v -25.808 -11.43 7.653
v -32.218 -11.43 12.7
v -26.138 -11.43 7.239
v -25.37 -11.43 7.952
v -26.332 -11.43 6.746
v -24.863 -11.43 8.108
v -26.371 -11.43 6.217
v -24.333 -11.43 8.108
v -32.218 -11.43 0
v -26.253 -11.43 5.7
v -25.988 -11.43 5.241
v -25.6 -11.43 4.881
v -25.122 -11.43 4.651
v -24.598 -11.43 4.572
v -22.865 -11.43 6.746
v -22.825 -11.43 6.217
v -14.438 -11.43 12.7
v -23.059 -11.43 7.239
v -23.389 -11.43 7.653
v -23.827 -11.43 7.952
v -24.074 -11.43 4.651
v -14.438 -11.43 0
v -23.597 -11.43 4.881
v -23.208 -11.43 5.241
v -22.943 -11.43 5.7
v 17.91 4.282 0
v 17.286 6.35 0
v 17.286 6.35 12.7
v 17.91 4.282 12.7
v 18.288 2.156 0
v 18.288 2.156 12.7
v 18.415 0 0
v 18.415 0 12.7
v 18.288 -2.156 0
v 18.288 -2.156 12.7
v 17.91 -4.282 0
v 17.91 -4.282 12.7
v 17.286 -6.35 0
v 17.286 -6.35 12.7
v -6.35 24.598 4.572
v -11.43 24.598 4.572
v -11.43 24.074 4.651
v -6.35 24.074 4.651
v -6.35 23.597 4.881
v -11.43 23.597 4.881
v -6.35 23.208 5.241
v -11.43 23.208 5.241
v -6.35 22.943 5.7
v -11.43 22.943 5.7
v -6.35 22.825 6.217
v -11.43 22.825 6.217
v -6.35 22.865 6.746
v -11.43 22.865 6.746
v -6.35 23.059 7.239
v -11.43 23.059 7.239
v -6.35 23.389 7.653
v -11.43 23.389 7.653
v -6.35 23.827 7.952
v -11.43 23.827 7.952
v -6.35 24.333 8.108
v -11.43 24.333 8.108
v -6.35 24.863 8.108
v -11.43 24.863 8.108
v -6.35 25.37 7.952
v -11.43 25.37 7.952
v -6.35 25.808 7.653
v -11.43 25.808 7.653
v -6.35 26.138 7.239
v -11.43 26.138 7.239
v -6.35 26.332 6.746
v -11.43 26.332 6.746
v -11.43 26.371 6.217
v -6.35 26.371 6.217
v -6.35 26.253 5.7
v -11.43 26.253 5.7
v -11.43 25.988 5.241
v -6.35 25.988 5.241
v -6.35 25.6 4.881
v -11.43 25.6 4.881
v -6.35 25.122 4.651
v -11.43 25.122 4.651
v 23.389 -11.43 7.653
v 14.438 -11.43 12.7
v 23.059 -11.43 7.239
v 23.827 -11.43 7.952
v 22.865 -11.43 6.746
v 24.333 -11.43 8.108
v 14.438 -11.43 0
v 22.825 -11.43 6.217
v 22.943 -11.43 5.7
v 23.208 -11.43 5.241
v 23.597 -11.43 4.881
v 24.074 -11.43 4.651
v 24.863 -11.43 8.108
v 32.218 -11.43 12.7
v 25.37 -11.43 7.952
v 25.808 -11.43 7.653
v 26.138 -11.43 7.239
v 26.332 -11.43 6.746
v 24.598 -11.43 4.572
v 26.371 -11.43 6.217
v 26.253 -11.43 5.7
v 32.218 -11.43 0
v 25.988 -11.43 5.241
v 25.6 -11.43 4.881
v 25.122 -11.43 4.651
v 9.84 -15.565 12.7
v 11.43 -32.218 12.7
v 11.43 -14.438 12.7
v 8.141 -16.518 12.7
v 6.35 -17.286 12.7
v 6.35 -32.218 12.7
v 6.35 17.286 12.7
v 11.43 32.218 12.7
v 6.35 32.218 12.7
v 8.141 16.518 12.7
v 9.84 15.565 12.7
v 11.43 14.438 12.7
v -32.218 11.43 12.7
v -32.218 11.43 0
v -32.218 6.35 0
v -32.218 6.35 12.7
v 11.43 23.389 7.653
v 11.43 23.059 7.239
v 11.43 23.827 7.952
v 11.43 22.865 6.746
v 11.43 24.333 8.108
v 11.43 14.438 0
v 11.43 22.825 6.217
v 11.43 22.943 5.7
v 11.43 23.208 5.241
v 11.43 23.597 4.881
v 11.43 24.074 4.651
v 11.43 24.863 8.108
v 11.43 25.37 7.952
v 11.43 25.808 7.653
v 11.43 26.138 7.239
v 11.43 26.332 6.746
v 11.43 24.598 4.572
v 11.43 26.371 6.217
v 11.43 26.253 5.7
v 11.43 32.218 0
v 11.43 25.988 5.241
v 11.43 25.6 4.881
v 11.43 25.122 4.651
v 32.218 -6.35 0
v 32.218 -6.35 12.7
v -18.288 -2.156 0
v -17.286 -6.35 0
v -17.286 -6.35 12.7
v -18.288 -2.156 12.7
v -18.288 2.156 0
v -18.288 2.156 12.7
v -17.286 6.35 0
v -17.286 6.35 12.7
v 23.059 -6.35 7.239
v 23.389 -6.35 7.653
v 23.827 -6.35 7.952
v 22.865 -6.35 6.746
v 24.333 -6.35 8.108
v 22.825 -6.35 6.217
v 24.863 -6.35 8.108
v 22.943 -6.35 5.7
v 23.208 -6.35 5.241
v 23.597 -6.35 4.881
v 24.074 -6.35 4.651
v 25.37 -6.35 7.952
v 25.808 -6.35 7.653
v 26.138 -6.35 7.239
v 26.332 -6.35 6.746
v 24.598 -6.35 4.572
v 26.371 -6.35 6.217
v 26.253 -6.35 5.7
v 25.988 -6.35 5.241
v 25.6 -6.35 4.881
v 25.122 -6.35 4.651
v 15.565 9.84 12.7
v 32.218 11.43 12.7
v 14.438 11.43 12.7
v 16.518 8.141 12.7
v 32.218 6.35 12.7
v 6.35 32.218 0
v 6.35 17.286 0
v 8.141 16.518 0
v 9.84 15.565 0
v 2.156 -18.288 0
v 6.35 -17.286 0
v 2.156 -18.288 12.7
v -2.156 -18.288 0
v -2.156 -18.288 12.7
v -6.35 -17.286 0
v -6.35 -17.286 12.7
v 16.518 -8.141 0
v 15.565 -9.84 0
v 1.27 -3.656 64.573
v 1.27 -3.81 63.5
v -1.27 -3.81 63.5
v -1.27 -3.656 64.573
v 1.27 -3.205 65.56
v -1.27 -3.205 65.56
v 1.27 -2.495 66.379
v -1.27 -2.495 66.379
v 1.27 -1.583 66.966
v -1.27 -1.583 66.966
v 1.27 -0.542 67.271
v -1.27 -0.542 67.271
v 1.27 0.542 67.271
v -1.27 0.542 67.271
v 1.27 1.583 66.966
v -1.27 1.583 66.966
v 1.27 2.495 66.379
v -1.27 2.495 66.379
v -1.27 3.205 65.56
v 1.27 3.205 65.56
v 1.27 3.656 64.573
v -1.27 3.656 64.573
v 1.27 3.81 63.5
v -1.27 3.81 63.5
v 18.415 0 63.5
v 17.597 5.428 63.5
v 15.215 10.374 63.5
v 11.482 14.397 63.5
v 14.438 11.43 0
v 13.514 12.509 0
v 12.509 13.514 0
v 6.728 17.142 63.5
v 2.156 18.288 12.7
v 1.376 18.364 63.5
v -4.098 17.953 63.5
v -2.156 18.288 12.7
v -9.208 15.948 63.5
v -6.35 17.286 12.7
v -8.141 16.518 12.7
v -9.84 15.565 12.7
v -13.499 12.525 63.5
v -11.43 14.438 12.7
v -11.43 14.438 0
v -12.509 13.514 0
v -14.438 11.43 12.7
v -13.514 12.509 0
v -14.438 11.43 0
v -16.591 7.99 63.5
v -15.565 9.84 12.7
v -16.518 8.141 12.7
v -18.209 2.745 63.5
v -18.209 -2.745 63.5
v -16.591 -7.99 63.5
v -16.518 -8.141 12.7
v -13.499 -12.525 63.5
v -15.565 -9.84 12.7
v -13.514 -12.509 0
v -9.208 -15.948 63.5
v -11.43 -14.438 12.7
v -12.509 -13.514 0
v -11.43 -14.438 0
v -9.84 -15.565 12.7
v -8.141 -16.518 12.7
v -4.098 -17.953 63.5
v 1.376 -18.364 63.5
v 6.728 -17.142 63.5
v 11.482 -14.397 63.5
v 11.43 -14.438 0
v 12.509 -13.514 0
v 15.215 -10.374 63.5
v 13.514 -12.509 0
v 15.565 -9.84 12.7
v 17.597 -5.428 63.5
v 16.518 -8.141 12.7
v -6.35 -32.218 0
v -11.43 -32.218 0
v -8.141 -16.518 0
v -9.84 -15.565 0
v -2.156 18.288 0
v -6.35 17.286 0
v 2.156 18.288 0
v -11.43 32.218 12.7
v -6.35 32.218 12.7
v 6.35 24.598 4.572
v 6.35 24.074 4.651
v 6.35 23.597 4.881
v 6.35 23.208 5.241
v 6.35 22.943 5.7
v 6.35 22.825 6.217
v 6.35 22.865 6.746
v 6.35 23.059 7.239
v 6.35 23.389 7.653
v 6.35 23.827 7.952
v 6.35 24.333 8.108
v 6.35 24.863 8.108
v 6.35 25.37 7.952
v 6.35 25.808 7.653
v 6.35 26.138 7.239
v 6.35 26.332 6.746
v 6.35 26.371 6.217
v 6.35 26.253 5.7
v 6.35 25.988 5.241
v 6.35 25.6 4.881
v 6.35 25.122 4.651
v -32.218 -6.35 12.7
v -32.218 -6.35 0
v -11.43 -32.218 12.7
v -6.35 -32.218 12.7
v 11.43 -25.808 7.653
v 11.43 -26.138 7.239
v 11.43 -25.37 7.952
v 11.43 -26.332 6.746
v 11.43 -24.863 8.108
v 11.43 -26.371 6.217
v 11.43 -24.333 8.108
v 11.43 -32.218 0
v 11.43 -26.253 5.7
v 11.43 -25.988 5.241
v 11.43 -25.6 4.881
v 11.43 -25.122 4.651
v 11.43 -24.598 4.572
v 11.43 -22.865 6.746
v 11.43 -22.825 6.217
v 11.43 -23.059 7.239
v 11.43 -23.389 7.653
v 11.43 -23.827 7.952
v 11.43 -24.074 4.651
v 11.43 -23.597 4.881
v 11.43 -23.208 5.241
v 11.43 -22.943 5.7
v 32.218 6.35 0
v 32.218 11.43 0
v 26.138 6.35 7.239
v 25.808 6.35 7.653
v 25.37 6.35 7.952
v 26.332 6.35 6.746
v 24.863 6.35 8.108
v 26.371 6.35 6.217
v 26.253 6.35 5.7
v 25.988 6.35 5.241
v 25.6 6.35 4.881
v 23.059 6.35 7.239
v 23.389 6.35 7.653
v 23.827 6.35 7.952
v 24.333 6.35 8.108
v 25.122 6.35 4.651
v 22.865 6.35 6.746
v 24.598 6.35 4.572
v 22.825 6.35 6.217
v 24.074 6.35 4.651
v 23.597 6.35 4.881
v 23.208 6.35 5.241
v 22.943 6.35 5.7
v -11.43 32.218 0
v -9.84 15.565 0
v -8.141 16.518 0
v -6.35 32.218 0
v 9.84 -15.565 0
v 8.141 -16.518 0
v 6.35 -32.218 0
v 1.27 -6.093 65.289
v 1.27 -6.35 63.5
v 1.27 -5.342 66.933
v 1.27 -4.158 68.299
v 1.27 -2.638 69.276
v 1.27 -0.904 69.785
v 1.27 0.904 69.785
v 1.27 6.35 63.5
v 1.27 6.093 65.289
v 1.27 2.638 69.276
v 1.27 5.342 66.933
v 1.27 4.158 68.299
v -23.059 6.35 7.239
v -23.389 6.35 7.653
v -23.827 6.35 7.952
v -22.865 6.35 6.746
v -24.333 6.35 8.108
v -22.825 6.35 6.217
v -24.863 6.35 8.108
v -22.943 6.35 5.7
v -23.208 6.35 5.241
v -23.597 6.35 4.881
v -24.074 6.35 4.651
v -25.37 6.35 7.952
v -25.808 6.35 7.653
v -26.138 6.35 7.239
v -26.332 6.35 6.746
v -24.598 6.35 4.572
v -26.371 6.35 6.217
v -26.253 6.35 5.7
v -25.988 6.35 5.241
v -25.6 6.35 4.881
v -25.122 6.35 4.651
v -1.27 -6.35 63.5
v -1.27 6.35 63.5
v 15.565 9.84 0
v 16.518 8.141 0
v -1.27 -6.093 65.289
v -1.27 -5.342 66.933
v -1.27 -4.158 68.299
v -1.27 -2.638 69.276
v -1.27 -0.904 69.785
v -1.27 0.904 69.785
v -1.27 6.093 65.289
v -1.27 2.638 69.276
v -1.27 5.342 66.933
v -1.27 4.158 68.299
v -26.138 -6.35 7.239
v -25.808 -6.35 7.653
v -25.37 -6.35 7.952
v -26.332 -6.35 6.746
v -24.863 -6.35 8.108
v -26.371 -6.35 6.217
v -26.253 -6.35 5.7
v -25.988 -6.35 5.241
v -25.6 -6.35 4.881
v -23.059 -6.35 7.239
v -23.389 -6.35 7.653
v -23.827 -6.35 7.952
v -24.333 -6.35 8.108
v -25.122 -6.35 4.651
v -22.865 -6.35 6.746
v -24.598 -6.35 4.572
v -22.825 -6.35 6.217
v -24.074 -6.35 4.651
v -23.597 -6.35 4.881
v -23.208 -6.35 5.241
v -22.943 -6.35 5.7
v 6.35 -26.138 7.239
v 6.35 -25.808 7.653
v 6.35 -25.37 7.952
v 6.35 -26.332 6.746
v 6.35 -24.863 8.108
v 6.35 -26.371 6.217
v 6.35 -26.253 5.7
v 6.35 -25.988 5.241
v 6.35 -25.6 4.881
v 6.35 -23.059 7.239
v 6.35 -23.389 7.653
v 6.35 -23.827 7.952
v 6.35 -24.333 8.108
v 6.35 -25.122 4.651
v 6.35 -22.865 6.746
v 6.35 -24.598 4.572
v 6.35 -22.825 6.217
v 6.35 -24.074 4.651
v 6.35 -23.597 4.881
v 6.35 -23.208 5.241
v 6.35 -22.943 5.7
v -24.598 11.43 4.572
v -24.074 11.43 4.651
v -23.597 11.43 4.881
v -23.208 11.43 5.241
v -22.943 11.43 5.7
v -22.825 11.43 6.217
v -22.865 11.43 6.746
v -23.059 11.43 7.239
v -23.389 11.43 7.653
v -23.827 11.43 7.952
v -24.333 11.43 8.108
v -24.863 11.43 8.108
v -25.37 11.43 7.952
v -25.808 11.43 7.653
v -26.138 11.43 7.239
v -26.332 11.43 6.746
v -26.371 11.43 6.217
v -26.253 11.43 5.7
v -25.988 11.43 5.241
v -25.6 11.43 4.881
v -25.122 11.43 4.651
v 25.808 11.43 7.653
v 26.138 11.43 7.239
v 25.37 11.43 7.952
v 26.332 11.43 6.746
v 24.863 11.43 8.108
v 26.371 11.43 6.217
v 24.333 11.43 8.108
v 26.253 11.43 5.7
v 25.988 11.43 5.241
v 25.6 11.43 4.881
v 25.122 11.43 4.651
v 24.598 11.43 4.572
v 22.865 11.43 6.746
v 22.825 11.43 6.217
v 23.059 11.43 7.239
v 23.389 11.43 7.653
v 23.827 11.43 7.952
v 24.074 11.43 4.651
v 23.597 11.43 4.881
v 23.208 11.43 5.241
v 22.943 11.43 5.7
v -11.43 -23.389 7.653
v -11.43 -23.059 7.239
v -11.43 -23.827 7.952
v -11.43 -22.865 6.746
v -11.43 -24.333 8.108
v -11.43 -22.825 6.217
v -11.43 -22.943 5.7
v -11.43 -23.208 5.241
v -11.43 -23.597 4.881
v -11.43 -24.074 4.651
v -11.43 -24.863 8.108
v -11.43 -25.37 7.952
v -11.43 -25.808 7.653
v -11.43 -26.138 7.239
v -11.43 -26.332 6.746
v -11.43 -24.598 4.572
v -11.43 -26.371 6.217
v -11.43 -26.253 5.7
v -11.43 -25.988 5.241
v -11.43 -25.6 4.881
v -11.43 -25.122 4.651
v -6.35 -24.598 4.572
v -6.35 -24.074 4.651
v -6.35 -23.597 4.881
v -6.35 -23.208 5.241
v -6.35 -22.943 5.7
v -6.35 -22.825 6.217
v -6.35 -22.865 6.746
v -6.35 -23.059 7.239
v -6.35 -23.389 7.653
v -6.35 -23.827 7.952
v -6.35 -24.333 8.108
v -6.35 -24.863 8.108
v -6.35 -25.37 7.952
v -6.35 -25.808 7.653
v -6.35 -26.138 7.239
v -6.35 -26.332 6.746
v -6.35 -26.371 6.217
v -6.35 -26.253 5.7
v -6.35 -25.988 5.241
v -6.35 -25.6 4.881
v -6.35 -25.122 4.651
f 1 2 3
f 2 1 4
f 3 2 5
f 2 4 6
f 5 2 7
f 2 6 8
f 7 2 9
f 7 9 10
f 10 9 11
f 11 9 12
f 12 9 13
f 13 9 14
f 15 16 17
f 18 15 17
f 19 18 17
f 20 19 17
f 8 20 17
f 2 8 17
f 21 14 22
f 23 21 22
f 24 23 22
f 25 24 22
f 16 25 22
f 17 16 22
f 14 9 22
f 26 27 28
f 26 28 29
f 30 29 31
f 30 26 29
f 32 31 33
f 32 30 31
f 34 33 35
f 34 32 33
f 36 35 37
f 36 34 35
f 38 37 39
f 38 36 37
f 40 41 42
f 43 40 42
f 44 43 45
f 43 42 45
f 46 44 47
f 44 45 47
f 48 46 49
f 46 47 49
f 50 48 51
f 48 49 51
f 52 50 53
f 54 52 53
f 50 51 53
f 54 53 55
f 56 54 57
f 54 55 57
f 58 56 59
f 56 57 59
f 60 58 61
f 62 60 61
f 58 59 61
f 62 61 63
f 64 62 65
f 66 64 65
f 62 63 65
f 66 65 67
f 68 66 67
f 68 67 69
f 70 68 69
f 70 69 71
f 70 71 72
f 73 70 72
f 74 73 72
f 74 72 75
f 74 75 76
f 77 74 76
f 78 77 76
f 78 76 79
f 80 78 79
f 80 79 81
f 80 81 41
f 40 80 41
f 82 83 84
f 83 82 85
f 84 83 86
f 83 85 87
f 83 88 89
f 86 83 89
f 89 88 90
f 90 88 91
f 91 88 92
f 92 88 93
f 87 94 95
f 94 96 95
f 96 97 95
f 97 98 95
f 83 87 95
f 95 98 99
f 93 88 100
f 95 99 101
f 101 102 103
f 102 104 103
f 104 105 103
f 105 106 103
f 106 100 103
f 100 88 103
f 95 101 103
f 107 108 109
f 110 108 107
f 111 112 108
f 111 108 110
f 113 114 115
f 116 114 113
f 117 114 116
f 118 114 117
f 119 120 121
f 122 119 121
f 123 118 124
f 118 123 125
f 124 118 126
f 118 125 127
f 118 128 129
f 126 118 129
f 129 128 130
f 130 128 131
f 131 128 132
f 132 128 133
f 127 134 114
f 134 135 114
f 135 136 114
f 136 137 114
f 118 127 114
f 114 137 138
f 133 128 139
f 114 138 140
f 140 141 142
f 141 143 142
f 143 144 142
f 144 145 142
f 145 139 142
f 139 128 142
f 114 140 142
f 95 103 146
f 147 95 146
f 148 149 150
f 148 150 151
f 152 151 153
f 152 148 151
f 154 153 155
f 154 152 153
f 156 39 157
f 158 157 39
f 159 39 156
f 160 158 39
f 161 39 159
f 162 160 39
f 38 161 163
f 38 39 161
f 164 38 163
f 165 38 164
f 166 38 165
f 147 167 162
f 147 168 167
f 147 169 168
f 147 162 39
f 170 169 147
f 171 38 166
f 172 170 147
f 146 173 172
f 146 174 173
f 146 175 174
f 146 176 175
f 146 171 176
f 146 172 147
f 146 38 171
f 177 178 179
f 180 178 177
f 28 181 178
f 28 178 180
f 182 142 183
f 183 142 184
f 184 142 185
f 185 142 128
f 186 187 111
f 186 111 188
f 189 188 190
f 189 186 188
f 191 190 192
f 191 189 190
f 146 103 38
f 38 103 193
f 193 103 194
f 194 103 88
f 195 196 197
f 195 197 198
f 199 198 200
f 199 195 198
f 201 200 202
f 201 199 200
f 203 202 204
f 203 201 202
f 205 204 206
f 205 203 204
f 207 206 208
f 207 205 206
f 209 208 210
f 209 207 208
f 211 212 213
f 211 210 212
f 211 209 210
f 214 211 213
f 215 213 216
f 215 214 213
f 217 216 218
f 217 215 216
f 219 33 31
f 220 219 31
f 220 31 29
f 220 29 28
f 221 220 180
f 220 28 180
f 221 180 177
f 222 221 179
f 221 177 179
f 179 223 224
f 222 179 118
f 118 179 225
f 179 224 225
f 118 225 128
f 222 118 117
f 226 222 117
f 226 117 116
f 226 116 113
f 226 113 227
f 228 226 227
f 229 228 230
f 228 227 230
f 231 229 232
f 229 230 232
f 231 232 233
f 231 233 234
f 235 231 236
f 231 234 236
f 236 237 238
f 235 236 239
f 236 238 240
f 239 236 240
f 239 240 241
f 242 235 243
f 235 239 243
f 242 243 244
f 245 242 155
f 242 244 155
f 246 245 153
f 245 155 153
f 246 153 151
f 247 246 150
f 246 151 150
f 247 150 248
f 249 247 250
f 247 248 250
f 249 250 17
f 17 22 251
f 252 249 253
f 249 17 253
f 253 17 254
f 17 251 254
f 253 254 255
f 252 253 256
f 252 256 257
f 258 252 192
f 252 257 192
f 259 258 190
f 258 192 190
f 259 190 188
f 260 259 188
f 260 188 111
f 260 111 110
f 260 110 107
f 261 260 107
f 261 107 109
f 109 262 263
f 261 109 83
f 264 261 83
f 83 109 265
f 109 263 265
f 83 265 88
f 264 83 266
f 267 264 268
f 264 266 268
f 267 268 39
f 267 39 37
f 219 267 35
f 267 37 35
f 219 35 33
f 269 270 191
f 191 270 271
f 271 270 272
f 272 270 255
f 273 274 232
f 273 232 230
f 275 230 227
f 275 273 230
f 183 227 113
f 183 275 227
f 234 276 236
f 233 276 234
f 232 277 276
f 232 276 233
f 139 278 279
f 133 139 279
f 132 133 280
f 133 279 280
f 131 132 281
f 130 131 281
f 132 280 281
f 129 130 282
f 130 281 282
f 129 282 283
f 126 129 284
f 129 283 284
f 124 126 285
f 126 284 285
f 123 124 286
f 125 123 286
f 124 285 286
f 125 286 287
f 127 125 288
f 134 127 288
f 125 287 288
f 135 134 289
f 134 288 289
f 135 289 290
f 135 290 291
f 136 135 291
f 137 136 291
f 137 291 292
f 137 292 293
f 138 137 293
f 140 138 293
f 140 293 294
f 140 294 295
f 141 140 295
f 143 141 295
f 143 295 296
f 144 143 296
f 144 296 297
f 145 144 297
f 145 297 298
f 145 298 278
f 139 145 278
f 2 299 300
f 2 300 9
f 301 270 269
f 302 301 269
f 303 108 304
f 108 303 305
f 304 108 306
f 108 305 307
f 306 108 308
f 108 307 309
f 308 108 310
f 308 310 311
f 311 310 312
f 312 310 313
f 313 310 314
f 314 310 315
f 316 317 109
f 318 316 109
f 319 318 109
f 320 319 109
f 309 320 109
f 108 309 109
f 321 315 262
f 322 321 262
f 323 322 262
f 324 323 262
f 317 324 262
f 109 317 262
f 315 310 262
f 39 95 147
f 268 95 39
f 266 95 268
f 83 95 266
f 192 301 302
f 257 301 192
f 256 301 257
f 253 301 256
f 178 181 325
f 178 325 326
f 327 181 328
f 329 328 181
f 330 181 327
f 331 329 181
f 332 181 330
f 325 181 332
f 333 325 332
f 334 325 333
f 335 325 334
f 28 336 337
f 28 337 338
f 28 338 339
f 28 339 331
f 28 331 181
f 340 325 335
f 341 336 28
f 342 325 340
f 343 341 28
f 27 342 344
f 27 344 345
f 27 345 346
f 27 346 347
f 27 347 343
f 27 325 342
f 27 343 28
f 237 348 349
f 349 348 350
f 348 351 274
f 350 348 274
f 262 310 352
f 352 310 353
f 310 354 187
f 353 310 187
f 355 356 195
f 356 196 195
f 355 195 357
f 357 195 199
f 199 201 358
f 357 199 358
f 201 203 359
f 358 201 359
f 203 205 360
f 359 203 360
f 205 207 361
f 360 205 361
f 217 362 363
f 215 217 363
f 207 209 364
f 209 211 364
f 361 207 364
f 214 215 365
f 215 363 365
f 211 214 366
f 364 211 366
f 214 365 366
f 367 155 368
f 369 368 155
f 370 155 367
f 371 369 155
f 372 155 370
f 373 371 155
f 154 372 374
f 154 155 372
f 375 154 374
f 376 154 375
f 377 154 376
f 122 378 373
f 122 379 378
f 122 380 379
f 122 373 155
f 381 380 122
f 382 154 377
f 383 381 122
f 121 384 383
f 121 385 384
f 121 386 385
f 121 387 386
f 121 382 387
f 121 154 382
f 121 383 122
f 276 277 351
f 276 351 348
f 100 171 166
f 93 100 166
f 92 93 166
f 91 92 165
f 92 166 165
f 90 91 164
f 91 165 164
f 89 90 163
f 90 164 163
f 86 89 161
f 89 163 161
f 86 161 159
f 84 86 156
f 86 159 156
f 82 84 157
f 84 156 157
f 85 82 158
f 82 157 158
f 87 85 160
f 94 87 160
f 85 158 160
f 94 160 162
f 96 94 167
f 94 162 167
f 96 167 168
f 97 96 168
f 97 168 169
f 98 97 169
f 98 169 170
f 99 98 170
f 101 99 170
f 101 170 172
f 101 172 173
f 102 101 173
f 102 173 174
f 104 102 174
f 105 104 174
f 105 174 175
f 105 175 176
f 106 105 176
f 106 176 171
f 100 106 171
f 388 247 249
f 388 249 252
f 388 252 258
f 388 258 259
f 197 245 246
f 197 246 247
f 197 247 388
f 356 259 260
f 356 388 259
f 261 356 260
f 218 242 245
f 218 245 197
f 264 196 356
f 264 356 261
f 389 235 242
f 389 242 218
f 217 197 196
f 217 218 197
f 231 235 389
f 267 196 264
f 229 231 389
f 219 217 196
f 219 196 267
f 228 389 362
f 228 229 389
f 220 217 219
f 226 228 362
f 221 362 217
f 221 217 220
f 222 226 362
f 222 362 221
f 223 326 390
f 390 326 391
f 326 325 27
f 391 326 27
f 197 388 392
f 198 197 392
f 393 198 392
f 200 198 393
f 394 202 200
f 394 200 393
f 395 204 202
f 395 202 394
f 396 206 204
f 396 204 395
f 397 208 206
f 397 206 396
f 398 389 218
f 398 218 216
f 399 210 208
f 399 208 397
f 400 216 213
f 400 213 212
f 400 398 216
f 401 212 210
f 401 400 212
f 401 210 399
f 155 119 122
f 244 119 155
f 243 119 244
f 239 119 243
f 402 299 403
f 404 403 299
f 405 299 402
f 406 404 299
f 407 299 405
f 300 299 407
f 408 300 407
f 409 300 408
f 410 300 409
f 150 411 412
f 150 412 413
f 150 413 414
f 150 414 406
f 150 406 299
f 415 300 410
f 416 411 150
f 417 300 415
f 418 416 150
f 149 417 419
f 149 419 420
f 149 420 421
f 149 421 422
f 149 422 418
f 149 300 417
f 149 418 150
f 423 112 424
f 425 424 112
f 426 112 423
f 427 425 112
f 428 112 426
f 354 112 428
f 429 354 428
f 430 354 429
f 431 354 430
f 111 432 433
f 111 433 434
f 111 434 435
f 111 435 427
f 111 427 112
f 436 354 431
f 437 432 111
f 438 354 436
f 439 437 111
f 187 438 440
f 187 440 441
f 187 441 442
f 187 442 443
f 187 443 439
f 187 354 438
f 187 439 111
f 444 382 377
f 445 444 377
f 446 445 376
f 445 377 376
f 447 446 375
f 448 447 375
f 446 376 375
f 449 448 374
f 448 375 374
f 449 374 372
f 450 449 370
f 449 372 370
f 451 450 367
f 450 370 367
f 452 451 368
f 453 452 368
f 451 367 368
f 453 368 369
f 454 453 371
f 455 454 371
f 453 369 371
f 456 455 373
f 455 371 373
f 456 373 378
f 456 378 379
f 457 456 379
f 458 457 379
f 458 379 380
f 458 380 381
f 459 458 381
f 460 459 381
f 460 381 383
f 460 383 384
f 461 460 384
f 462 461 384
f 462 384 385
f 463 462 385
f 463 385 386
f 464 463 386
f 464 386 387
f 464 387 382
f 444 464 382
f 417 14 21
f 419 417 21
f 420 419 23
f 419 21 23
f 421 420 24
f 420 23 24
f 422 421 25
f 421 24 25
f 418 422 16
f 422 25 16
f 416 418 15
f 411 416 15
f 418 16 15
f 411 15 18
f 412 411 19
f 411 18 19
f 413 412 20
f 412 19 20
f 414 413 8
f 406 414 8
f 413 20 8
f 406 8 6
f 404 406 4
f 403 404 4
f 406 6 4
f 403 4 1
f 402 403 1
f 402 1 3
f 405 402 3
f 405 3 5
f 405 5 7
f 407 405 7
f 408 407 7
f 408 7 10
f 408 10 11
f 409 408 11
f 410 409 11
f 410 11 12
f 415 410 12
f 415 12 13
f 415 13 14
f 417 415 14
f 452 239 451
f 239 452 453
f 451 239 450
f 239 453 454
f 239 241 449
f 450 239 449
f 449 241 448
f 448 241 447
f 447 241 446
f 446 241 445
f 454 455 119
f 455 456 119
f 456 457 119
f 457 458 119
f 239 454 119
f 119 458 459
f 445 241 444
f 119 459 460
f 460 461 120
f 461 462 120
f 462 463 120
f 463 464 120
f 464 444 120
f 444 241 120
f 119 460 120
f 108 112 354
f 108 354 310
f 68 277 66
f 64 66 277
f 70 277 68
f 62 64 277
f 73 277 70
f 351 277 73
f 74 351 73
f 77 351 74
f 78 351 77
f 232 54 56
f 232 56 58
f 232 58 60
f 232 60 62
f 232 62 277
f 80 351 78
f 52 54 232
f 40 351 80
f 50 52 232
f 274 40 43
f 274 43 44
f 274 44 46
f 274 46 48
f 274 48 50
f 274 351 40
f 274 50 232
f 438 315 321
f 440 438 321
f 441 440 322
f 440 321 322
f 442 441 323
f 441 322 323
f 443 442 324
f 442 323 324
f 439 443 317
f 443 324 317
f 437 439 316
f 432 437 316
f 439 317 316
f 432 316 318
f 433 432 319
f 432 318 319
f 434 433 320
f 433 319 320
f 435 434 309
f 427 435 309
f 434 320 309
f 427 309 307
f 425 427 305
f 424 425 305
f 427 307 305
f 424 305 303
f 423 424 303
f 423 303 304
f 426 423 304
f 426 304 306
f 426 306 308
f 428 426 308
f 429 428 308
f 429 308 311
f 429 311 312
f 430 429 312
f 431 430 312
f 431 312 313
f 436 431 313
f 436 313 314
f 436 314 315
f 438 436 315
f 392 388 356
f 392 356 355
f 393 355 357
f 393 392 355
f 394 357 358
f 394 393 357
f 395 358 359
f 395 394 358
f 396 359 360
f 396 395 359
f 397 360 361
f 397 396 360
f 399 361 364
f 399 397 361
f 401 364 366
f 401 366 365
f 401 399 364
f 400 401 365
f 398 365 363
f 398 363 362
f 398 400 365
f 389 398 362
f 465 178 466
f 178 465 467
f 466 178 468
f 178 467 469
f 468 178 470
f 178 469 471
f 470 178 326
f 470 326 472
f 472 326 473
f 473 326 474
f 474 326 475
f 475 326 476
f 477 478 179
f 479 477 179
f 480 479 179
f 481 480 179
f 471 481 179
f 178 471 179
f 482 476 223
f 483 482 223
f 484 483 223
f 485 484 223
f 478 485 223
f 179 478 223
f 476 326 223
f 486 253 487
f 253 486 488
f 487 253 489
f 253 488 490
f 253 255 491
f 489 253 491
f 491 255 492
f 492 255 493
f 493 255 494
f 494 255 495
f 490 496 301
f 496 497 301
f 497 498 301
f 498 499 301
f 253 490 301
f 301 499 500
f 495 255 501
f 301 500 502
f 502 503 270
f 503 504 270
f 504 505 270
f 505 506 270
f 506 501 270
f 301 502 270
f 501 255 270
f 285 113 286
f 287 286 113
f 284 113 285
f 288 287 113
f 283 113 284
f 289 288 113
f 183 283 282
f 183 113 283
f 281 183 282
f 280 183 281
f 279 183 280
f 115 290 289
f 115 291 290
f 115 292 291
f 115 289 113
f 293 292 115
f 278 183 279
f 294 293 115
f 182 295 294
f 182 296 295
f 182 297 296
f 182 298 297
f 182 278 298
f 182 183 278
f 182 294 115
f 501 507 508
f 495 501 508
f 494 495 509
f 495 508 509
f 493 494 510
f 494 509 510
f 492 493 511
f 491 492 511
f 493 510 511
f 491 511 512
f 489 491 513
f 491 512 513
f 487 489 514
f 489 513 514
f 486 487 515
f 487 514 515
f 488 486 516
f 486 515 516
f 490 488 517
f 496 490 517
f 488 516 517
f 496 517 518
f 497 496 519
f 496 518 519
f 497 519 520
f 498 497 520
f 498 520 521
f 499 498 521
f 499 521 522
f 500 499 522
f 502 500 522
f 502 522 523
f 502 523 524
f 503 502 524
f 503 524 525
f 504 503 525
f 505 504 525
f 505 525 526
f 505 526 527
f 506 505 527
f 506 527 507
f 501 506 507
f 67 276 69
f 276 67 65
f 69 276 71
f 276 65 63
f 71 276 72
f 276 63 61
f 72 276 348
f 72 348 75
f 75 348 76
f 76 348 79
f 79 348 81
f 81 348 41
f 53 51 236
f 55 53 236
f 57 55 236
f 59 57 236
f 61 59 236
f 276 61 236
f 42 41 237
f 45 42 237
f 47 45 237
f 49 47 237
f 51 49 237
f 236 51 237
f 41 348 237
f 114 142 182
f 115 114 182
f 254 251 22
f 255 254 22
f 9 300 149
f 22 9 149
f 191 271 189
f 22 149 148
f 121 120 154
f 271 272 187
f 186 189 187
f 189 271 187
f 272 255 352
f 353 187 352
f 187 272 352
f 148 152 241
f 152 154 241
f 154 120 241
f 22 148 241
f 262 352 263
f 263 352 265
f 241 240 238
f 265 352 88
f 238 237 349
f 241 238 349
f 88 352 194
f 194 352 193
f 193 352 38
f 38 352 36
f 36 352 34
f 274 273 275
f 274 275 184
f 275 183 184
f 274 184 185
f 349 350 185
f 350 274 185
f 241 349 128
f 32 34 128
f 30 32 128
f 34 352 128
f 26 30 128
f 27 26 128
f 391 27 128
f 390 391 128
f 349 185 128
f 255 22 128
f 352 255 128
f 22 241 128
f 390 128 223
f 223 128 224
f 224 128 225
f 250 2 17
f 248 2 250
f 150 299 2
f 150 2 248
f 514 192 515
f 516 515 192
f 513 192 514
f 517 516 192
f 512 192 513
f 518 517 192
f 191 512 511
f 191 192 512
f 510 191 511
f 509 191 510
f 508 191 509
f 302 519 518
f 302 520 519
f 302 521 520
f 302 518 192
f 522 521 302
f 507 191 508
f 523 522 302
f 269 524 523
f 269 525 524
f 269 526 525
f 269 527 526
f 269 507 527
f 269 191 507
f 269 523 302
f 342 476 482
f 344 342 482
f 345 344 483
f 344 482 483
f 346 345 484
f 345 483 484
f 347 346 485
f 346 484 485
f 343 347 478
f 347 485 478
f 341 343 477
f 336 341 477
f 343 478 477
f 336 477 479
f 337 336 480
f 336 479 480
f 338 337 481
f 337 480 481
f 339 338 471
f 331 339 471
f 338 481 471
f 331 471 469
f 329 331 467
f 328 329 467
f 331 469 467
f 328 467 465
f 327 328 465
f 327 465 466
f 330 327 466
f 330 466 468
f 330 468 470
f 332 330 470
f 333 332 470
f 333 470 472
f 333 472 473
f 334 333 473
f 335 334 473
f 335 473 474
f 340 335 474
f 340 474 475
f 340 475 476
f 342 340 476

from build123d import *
from build123d.topology import SkipClean

# Parameters (mm, degrees)
SKETCH1_R                = 18.415
BOSS_EXTRUDE1_DEPTH      = 63.5
BOSS_EXTRUDE4_DEPTH      = 12.7
SKETCH9_R                = 1.778
CUT_EXTRUDE2_DEPTH       = 25.4
BOSS_EXTRUDE5_DEPTH      = 1.27
BOSS_EXTRUDE5_DEPTH_BACK = 1.27
CUT_EXTRUDE3_DEPTH       = 15.24
CUT_EXTRUDE4_START       = -12.7
CUT_EXTRUDE4_DEPTH       = 12.7
CIRPATTERN1_COUNT        = 4


with BuildPart() as part:
    # Sketch1 → Boss-Extrude1 (new body)
    with BuildSketch(Plane.XY):
        Circle(SKETCH1_R)
    extrude(amount=BOSS_EXTRUDE1_DEPTH)

    # Sketch8 → Boss-Extrude4 (add)
    with BuildSketch(Plane.XY):
        with BuildLine():
            Line((-14.438397591, 11.43), (-32.218397591, 11.43))
            Line((-32.218397591, 11.43), (-32.218397591, -11.43))
            Line((-32.218397591, -11.43), (-14.438397591, -11.43))
            ThreePointArc((-14.438397591, -11.43), (-18.415, 0), (-14.438397591, 11.43))
        make_face()
    boss_extrude4 = extrude(amount=BOSS_EXTRUDE4_DEPTH)

    # Sketch9 → Cut-Extrude2 (cut)
    with BuildSketch(Plane.XZ.offset(11.43)):
        with Locations(Location((-24.598397591, 6.35, 0), (0, 0, 270))):
            Circle(SKETCH9_R)
    cut_extrude2 = extrude(amount=-CUT_EXTRUDE2_DEPTH, mode=Mode.SUBTRACT)

    # Sketch13 → Boss-Extrude5 (add, two sides: drawn at the far end of the back side and taken through both)
    with BuildSketch(Plane(origin=(0, 0, 0), x_dir=(0, 0, -1), z_dir=(1, 0, 0)).offset(-BOSS_EXTRUDE5_DEPTH_BACK)):
        with BuildLine():
            Line((-63.5, 6.35), (-63.5, -6.35))
            ThreePointArc((-63.5, -6.35), (-69.85, 0), (-63.5, 6.35))
        make_face()
    extrude(amount=BOSS_EXTRUDE5_DEPTH + BOSS_EXTRUDE5_DEPTH_BACK)

    # Sketch14 → Cut-Extrude3 (cut)
    with BuildSketch(Plane(origin=(1.27, 0, 0), x_dir=(0, 0, -1), z_dir=(1, 0, 0))):
        with BuildLine():
            Line((-63.5, 3.81), (-63.5, -3.81))
            ThreePointArc((-63.5, -3.81), (-67.31, 0), (-63.5, 3.81))
        make_face()
    extrude(amount=-CUT_EXTRUDE3_DEPTH, mode=Mode.SUBTRACT)

    # Sketch15 → Cut-Extrude4 (cut)
    with SkipClean():  # the faces are left unmerged after this step: merging them gives an invalid solid
        with BuildSketch(Plane.XY.offset(12.7).offset(CUT_EXTRUDE4_START)):
            with BuildLine():
                Line((-17.285535138, 6.35), (-32.218397591, 6.35))
                Line((-32.218397591, 6.35), (-32.218397591, -6.35))
                Line((-32.218397591, -6.35), (-17.285535138, -6.35))
                ThreePointArc((-17.285535138, -6.35), (-18.415, 0), (-17.285535138, 6.35))
            make_face()
        cut_extrude4 = extrude(amount=CUT_EXTRUDE4_DEPTH, mode=Mode.SUBTRACT)

    # CirPattern1: Boss-Extrude4, Cut-Extrude2, Cut-Extrude4 ×4 about axis
    with SkipClean():  # the faces are left unmerged after this step: merging them gives an invalid solid
        cirpattern1_axis = Axis((0, 0, 0), (0, 0, 1))
        add([boss_extrude4.rotate(cirpattern1_axis, i * 360 / CIRPATTERN1_COUNT) for i in range(1, CIRPATTERN1_COUNT)])
        add([cut_extrude2.rotate(cirpattern1_axis, i * 360 / CIRPATTERN1_COUNT) for i in range(1, CIRPATTERN1_COUNT)], mode=Mode.SUBTRACT)
        add([cut_extrude4.rotate(cirpattern1_axis, i * 360 / CIRPATTERN1_COUNT) for i in range(1, CIRPATTERN1_COUNT)], mode=Mode.SUBTRACT)


solid = part.part
